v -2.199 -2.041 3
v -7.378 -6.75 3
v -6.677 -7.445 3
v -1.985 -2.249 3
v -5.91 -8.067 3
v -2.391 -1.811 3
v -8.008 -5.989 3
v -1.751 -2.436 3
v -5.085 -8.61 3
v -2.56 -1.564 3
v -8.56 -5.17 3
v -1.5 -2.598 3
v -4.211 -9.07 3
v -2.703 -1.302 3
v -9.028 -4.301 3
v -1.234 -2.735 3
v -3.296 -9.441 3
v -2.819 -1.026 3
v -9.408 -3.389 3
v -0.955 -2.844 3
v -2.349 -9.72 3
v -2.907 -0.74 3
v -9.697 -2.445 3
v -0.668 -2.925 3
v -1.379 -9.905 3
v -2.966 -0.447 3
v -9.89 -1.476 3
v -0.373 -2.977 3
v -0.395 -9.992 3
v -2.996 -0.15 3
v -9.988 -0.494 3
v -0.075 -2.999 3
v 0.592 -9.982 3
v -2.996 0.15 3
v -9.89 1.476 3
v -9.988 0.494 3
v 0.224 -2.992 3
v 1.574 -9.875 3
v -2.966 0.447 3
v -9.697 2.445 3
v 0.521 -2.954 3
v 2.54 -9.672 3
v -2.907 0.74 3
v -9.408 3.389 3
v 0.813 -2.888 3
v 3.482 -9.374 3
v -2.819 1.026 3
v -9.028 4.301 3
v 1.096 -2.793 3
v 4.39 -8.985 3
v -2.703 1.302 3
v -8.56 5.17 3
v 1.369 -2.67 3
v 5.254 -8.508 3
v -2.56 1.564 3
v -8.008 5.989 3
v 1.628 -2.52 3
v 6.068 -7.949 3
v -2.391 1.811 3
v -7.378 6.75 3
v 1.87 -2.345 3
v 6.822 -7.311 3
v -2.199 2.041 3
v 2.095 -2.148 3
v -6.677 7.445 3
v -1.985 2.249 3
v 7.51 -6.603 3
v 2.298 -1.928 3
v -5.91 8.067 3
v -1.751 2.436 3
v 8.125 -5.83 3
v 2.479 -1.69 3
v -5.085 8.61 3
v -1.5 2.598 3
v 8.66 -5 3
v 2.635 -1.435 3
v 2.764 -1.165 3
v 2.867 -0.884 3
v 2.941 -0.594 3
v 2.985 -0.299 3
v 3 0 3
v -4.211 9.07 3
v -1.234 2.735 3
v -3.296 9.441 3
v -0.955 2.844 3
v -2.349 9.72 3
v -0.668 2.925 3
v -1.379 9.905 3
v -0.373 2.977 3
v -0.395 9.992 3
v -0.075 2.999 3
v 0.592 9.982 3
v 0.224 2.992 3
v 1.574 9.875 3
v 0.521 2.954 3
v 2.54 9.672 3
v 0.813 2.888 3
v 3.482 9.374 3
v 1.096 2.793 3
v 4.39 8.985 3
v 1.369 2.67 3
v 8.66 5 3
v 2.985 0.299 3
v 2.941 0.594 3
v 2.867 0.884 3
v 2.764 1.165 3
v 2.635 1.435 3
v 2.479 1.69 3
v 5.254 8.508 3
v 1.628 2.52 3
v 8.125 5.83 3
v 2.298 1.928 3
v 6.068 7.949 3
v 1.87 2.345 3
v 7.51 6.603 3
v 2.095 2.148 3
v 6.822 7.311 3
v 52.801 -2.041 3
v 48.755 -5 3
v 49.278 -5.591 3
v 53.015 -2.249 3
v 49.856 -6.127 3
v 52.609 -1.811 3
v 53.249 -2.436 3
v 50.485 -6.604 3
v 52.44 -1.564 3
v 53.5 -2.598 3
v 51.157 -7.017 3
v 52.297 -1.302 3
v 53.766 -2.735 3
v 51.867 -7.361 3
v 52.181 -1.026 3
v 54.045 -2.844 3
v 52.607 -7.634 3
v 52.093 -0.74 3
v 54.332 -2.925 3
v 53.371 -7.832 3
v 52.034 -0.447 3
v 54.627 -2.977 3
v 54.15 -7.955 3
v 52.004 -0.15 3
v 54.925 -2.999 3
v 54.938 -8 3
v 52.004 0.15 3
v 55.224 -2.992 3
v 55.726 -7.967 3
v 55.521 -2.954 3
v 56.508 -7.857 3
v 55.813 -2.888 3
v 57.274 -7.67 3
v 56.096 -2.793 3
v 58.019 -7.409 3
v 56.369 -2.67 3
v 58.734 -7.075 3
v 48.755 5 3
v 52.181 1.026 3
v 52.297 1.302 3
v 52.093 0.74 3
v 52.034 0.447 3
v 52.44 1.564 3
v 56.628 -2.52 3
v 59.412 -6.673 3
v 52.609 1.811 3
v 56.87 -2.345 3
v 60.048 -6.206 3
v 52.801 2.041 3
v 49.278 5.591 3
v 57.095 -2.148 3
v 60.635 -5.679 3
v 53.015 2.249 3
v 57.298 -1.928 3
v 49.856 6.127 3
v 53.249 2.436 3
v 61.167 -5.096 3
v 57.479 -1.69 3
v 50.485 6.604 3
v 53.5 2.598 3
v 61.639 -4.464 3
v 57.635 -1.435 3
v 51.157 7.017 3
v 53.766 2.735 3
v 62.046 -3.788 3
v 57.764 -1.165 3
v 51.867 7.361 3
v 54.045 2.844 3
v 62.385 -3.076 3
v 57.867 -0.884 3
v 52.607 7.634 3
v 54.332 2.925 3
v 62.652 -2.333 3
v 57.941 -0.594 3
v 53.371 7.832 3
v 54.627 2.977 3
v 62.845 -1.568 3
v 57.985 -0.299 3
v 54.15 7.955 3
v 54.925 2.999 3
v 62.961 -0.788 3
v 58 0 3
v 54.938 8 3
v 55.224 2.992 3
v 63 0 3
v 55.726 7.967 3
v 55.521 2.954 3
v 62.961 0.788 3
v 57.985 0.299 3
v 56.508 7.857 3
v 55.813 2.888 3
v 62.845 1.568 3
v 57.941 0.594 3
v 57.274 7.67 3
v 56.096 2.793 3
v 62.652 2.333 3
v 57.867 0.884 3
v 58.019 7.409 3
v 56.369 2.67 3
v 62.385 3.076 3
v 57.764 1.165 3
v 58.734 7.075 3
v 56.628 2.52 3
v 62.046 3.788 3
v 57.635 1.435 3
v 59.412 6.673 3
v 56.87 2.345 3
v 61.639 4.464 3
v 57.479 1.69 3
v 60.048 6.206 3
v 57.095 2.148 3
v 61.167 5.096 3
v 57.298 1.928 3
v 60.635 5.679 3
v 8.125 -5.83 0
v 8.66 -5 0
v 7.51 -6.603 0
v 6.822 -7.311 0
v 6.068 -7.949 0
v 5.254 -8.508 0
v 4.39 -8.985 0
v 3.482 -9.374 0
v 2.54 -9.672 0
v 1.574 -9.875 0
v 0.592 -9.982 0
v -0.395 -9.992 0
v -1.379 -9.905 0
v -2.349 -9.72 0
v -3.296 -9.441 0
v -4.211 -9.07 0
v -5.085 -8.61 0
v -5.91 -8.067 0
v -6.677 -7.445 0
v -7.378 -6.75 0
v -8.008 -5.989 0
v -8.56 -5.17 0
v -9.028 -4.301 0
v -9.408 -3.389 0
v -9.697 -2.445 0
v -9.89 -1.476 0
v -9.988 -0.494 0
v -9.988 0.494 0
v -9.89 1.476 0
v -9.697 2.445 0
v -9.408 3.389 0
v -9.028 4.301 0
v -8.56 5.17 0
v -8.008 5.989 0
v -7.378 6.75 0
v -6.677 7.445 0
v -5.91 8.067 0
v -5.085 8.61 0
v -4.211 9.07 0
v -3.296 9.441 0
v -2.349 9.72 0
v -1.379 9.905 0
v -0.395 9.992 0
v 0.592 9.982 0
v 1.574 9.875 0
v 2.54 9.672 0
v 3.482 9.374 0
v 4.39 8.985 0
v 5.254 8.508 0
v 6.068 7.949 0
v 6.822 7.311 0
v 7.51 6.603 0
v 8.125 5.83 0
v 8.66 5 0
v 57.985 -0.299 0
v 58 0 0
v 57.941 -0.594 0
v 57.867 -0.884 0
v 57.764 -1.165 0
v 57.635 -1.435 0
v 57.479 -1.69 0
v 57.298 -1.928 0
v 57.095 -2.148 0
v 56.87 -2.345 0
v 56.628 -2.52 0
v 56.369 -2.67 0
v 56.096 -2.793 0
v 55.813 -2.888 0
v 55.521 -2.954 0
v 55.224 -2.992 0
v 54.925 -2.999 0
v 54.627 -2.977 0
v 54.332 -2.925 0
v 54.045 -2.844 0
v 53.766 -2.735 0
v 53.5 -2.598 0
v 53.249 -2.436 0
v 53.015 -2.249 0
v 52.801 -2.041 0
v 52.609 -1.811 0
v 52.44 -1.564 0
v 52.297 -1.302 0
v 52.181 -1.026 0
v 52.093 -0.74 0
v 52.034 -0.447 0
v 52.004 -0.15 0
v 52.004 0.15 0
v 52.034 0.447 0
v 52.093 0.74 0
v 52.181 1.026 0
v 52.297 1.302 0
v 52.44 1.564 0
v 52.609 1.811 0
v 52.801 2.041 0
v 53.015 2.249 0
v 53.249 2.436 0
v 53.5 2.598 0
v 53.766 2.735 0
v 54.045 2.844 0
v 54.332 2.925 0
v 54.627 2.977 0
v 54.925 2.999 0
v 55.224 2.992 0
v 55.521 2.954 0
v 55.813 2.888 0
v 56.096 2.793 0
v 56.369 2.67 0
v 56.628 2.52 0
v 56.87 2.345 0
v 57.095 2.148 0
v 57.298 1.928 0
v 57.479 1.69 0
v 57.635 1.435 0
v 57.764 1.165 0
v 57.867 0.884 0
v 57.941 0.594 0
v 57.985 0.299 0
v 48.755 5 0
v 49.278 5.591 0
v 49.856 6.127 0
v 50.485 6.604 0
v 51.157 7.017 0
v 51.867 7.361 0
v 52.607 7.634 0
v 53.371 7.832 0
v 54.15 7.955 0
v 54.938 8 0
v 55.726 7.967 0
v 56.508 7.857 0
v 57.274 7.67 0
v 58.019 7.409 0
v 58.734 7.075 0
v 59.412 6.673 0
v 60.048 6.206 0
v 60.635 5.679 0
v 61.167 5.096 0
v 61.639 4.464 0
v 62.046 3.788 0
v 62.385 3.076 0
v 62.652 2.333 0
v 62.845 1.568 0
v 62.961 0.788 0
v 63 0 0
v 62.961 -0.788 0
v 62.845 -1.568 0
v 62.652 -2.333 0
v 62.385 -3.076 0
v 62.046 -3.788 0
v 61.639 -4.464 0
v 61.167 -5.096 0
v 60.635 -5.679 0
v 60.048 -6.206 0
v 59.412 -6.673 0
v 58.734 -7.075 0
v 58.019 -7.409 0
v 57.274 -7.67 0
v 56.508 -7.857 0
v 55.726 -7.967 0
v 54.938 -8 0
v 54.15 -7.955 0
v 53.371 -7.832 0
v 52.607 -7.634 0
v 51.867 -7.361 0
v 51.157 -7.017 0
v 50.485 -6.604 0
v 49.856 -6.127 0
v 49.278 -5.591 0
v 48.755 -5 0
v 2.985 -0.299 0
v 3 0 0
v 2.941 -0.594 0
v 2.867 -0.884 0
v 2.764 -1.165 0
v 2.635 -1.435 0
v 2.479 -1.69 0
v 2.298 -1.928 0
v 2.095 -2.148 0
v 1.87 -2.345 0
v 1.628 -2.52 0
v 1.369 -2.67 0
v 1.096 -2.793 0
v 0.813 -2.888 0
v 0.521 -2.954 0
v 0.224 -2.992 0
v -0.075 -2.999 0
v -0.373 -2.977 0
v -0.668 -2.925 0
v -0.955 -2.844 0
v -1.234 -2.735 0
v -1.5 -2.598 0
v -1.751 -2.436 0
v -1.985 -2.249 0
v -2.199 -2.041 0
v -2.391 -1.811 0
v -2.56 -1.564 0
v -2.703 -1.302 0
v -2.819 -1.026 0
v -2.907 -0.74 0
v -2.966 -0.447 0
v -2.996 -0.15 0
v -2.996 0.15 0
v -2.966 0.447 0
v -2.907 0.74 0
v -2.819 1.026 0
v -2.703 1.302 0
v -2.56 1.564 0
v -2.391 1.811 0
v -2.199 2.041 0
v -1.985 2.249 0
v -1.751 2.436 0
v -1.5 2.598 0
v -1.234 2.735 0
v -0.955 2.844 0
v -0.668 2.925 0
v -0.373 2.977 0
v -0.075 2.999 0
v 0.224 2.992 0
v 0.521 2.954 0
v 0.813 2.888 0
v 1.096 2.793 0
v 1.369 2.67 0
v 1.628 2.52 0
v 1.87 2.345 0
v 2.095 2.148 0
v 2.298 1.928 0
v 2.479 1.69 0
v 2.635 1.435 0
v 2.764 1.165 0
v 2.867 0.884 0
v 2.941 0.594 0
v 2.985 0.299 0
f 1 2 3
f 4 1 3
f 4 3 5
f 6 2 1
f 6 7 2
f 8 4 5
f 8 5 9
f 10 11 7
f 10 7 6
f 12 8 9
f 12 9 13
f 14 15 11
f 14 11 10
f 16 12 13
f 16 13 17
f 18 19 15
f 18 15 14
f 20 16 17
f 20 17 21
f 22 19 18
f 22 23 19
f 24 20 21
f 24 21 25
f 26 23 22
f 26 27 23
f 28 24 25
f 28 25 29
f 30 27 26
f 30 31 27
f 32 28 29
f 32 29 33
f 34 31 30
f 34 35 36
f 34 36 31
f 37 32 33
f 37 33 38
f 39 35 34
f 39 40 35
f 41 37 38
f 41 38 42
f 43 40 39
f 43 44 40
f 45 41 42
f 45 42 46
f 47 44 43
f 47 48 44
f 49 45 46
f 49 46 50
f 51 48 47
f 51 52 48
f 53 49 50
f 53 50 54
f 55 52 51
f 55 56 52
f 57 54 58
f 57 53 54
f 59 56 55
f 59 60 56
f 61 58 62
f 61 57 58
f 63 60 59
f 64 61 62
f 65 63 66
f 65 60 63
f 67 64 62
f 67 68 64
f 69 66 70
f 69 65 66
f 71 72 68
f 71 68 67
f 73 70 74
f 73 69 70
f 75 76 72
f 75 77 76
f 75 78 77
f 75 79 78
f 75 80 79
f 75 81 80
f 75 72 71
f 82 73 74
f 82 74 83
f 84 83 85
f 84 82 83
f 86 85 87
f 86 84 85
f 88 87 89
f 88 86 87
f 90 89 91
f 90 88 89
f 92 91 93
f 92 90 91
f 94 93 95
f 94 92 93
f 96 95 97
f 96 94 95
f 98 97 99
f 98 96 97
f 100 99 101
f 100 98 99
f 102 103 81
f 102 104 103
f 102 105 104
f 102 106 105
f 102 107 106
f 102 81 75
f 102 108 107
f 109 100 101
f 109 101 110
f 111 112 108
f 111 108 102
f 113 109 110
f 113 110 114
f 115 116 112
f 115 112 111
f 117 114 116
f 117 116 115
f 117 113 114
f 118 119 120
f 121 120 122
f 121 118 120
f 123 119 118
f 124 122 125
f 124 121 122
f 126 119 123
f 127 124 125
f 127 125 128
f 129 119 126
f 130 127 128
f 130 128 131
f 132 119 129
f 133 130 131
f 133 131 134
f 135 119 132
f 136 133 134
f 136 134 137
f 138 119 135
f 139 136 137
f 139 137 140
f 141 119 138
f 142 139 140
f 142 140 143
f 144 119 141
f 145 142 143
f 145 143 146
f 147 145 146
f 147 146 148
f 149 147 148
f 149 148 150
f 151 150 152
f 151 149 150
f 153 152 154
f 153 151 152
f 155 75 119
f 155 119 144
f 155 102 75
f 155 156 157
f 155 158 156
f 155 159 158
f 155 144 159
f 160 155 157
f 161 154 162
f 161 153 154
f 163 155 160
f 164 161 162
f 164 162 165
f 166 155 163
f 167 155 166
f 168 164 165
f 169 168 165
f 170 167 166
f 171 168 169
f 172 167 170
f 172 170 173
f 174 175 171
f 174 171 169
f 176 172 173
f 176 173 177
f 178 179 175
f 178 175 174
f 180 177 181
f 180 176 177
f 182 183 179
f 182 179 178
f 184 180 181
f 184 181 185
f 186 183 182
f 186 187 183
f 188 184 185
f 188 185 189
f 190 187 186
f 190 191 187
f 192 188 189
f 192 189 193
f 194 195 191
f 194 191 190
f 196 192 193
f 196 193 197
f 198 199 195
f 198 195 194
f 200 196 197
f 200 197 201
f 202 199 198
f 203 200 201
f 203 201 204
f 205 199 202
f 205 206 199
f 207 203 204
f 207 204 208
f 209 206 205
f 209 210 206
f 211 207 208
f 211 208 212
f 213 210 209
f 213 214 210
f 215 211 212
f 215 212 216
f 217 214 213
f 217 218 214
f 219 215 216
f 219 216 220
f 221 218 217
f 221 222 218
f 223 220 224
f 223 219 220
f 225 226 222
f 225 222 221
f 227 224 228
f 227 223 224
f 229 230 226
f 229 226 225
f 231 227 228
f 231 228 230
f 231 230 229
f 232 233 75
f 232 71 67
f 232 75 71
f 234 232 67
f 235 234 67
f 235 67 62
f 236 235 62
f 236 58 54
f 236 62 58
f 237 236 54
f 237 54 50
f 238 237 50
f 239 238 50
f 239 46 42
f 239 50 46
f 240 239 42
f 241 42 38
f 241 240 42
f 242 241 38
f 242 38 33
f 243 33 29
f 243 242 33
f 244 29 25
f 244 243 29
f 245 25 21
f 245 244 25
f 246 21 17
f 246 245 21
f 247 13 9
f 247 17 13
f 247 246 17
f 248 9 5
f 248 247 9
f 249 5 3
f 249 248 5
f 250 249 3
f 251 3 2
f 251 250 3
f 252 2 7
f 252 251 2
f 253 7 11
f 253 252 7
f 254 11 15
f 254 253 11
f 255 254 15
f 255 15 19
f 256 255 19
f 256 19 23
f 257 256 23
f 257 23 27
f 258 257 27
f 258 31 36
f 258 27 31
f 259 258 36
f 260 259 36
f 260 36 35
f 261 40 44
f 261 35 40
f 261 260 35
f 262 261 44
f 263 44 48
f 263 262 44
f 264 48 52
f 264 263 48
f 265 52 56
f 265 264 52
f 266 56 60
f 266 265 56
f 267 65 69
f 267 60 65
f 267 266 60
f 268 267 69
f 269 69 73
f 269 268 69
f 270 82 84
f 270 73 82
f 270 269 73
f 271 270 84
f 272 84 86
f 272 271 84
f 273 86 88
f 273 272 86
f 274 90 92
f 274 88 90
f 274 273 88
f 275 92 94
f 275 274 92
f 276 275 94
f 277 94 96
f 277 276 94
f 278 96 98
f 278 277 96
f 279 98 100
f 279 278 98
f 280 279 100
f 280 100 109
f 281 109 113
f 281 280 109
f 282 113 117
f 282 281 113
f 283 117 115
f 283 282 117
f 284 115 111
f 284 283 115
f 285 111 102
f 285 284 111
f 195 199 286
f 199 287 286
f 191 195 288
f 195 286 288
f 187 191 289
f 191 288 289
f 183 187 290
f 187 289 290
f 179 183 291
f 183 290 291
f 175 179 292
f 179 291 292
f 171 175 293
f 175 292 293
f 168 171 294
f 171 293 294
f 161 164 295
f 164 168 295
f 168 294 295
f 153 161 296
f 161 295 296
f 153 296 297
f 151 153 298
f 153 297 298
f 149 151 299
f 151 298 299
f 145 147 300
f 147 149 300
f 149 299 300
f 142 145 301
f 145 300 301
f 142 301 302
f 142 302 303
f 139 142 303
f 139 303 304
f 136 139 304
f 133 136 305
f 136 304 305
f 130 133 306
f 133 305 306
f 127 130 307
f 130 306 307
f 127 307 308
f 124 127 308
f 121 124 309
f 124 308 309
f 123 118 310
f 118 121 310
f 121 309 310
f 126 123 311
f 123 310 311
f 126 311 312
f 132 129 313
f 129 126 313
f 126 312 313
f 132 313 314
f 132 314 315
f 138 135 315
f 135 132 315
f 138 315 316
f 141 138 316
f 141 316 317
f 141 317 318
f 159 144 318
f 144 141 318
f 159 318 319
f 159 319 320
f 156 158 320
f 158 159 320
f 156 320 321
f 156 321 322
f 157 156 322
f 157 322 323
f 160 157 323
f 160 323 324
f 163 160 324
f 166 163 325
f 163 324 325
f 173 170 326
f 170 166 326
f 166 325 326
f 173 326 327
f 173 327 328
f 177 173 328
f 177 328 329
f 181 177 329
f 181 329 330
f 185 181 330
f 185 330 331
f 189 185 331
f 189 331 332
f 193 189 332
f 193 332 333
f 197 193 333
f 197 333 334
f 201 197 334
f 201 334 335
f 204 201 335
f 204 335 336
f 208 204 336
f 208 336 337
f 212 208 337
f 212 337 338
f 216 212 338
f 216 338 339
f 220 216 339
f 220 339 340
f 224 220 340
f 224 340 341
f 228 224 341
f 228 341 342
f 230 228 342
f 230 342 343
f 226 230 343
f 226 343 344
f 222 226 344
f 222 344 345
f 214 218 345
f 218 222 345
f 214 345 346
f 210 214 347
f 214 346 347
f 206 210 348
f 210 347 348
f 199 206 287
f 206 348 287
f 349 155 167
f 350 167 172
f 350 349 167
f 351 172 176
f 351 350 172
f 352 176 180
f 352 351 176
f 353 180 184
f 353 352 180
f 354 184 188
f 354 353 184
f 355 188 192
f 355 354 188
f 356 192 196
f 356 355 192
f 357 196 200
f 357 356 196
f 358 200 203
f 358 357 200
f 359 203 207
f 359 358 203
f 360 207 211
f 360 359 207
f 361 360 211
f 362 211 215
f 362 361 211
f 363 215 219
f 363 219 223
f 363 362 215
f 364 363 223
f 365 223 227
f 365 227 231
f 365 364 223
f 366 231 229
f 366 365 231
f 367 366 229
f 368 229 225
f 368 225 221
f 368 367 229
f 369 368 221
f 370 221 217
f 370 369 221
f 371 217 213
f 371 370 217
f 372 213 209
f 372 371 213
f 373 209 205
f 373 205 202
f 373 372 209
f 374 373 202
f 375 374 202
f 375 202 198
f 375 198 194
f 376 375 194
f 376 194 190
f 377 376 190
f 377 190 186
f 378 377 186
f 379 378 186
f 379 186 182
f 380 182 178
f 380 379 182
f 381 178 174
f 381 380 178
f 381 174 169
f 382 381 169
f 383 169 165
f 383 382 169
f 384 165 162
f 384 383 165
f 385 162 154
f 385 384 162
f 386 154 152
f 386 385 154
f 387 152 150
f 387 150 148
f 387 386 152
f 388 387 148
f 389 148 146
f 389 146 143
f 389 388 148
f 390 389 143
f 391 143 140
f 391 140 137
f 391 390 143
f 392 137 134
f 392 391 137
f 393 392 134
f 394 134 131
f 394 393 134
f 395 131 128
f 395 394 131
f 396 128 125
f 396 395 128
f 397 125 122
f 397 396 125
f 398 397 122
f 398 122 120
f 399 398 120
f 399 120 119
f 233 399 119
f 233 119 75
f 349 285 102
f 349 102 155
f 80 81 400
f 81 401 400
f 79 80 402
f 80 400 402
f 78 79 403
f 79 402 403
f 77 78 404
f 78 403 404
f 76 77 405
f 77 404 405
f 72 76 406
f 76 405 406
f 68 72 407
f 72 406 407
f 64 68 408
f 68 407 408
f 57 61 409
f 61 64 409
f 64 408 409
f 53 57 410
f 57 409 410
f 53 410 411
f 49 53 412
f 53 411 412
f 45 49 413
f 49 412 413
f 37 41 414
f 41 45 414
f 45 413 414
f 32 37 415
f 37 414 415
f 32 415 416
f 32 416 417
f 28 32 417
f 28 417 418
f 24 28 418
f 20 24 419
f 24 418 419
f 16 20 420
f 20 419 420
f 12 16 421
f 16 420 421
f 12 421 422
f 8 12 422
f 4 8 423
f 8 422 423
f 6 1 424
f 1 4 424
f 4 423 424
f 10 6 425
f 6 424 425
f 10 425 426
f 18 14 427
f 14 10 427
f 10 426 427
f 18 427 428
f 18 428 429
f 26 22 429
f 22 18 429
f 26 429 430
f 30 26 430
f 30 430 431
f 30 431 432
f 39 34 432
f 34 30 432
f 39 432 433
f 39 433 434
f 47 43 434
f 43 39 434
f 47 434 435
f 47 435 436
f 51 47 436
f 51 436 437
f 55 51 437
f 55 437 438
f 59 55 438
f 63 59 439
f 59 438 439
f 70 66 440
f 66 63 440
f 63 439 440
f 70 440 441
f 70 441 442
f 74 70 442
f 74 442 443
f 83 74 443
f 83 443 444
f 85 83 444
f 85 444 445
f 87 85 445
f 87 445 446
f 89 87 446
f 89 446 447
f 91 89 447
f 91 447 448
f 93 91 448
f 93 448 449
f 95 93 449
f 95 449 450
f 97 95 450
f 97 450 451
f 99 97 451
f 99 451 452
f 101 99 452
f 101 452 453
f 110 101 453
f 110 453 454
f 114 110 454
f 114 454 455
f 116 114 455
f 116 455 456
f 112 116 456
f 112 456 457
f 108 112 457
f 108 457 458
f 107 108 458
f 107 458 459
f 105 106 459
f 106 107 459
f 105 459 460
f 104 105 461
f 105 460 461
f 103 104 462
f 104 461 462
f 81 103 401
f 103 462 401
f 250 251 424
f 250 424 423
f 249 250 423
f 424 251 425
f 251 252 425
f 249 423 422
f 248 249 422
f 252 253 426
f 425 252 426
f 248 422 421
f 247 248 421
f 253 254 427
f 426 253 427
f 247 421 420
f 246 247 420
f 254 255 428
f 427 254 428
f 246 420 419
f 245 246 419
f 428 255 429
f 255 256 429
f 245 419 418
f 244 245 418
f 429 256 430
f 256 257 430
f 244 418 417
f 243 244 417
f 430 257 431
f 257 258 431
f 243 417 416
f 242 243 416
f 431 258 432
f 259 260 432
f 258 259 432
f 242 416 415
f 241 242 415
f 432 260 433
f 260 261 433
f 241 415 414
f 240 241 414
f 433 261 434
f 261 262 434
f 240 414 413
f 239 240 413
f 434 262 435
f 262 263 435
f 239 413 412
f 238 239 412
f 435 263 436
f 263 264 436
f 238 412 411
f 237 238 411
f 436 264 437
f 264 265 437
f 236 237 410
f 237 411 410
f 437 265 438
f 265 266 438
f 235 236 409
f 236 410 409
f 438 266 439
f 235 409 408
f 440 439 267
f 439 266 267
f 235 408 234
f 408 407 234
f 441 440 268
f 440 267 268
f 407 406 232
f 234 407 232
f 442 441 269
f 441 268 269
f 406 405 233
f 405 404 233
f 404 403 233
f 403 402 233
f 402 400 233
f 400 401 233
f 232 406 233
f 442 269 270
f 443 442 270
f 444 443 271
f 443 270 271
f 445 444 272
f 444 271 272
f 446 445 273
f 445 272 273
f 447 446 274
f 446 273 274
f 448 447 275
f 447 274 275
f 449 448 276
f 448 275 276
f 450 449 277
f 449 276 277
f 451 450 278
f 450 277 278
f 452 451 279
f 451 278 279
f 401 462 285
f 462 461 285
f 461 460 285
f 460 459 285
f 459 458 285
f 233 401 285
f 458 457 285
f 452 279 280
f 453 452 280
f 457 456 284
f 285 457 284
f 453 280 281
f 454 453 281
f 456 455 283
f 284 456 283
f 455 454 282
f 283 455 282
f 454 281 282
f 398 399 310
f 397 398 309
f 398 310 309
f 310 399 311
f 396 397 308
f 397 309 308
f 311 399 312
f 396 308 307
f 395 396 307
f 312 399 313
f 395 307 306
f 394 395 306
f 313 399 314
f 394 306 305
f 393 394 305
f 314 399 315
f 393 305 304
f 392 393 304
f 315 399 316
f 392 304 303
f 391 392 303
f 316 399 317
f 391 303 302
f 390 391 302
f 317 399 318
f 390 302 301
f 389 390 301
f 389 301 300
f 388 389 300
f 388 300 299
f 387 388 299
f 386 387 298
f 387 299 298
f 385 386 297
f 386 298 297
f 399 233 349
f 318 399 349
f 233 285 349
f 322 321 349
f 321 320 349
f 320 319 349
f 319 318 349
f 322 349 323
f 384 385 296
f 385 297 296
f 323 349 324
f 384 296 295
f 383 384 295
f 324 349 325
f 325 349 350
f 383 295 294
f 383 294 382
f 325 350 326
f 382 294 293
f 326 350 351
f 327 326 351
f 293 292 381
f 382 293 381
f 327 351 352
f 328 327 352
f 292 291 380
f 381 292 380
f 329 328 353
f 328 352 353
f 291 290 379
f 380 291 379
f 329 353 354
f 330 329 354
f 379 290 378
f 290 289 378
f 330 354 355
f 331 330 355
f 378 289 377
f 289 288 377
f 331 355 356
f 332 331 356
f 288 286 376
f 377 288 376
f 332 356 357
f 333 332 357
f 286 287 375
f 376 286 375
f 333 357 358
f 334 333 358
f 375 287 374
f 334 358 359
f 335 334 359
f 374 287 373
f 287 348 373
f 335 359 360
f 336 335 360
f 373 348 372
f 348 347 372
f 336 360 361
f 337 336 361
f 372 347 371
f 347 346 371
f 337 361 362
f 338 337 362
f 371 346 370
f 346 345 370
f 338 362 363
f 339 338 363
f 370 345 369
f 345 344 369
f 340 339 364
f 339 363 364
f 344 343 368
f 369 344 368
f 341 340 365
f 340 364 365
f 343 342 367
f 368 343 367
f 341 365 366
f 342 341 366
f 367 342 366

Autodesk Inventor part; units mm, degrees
ref_plane "YZ Plane" through (0, 0, 0) normal (1, 0, 0) x (0, 1, 0)
ref_plane "XZ Plane" through (0, 0, 0) normal (0, 1, 0) x (-1, 0, 0)
ref_plane "XY Plane" through (0, 0, 0) normal (0, 0, 1) x (1, 0, 0)
sketch "Base" plane through (0, 0, 0) normal (0, 0, 1) x (1, 0, 0)
  circle A0 centre (0, 0) radius 10
  line L0 (0, 0) -> (55, 0) construction
  circle A1 centre (55, 0) radius 8
  line L1 (8.6603, 5) -> (48.755, 5)
  line L2 (48.755, 5) -> (48.755, -5)
  line L3 (48.755, -5) -> (8.6603, -5)
  line L4 (8.6603, -5) -> (8.6603, 5)
  circle A2 centre (55, 0) radius 3
  circle A3 centre (0, 0) radius 3
  point P0 (8.6603, 0)
  point P1 (8.6603, -5)
  dimension "d0" = 20
  dimension "d2" = 16
  dimension "d1" = 55
  dimension "d3" = 10
  dimension "d4" = 6
  dimension "d5" = 6
extrude "Plate1" add sketch "Base" along normal blind 3
equation "\"d6\" = Thickness"
equation "\"BendRadius\" = Thickness"
equation "\"BendReliefWidth\" = Thickness"
equation "\"BendReliefDepth\" = 0.5 * Thickness"
equation "\"CornerReliefSize\" = 4 * Thickness"
equation "\"MinimumRemnant\" = 2 * Thickness"
equation "\"TransitionRadius\" = BendRadius"
equation "\"JacobiRadiusSize\" = BendRadius"
equation "\"GapSize\" = Thickness"
equation "\"Thickness\" = 3"
properties part number "LegChainTensionerArm"
